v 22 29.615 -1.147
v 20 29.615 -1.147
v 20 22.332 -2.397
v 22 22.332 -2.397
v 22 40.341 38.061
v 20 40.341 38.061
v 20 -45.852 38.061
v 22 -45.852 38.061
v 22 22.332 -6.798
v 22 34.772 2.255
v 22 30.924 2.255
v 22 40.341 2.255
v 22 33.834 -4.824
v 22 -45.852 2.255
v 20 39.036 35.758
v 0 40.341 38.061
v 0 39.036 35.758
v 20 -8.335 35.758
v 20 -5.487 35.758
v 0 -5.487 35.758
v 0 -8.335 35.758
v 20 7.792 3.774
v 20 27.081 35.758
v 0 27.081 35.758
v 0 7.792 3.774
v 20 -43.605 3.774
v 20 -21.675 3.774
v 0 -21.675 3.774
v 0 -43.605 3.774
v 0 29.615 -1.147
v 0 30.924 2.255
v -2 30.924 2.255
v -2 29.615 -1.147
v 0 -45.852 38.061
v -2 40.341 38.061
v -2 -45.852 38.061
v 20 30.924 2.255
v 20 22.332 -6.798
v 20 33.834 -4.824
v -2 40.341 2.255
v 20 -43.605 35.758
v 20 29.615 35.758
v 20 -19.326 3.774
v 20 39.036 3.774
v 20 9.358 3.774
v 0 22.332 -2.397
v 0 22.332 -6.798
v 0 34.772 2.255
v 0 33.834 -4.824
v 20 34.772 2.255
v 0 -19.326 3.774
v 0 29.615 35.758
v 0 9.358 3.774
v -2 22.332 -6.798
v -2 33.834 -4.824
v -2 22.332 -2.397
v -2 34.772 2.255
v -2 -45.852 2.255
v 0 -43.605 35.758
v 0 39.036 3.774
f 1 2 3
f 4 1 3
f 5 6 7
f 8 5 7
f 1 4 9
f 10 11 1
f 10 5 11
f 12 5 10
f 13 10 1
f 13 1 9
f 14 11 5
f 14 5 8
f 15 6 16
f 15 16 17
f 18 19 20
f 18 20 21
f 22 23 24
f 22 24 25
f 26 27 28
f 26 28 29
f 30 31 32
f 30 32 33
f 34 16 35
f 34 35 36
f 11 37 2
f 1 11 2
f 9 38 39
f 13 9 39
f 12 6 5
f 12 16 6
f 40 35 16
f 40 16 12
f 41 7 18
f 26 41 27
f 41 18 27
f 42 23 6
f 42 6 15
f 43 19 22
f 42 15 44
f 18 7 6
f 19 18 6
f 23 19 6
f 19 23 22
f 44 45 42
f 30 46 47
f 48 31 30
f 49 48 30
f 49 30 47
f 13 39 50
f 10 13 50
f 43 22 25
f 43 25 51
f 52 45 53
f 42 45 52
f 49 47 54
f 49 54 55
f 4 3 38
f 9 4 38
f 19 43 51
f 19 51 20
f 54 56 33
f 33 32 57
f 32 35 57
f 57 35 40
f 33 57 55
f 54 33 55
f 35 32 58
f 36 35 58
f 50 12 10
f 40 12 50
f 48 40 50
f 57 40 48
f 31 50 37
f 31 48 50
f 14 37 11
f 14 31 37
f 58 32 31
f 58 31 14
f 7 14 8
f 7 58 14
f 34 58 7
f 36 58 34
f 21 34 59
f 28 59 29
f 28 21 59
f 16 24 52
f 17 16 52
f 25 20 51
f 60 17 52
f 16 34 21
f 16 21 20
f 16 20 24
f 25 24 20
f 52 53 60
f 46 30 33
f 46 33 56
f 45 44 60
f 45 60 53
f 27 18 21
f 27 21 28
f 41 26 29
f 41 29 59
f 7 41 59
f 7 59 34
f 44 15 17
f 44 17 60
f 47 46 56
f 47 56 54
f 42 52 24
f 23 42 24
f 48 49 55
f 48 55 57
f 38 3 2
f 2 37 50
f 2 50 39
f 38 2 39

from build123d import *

# Parameters (mm, degrees)
BOSS_EXTRUDE1_DEPTH = 10
BOSS_EXTRUDE2_DEPTH = 2


with BuildPart() as part:
    # Sketch1 → Boss-Extrude1 (new body)
    with BuildSketch(Plane(origin=(0, 0, 0), x_dir=(0, 0, -1), z_dir=(1, 0, 0))):
        Polygon((-3.774433469, 9.358035215), (-35.757790758, 29.614700037), (-35.757790758, 27.080766413), (-3.774433469, 7.792183966), (-3.774433469, -19.326020697), (-35.757790758, -5.486543586), (-35.757790758, -8.33500588), (-3.774433469, -21.674922387), (-3.774433469, -43.604639285), (-35.757790758, -43.604639285), (-38.060598591, -45.851882357), (-2.255261006, -45.851882357), (-2.255261006, 40.341171907), (-38.060598591, 40.341171907), (-35.757790758, 39.035588244), (-3.774433469, 39.035588244), align=None)
    boss_extrude1 = extrude(amount=BOSS_EXTRUDE1_DEPTH)

    # Sketch1<4> → Boss-Extrude2 (add)
    with BuildSketch(Plane(origin=(0, 0, 0), x_dir=(0, 0, -1), z_dir=(1, 0, 0))):
        Polygon((-38.060598591, 40.341171907), (-38.060598591, -45.851882357), (-2.255261006, -45.851882357), (-2.255261006, 30.924278392), (1.146733549, 29.614700037), (2.396539842, 22.331937706), (6.798273933, 22.331937706), (4.824416605, 33.833827141), (-2.255261006, 34.77223015), (-2.255261006, 40.341171907), align=None)
    boss_extrude2 = extrude(amount=-BOSS_EXTRUDE2_DEPTH)

    # Mirror1: Boss-Extrude1, Boss-Extrude2 across plane
    add(boss_extrude1.mirror(Plane(origin=(10, 0, 0), x_dir=(0, 0, 1), z_dir=(1, 0, 0))))
    add(boss_extrude2.mirror(Plane(origin=(10, 0, 0), x_dir=(0, 0, 1), z_dir=(1, 0, 0))))


solid = part.part
